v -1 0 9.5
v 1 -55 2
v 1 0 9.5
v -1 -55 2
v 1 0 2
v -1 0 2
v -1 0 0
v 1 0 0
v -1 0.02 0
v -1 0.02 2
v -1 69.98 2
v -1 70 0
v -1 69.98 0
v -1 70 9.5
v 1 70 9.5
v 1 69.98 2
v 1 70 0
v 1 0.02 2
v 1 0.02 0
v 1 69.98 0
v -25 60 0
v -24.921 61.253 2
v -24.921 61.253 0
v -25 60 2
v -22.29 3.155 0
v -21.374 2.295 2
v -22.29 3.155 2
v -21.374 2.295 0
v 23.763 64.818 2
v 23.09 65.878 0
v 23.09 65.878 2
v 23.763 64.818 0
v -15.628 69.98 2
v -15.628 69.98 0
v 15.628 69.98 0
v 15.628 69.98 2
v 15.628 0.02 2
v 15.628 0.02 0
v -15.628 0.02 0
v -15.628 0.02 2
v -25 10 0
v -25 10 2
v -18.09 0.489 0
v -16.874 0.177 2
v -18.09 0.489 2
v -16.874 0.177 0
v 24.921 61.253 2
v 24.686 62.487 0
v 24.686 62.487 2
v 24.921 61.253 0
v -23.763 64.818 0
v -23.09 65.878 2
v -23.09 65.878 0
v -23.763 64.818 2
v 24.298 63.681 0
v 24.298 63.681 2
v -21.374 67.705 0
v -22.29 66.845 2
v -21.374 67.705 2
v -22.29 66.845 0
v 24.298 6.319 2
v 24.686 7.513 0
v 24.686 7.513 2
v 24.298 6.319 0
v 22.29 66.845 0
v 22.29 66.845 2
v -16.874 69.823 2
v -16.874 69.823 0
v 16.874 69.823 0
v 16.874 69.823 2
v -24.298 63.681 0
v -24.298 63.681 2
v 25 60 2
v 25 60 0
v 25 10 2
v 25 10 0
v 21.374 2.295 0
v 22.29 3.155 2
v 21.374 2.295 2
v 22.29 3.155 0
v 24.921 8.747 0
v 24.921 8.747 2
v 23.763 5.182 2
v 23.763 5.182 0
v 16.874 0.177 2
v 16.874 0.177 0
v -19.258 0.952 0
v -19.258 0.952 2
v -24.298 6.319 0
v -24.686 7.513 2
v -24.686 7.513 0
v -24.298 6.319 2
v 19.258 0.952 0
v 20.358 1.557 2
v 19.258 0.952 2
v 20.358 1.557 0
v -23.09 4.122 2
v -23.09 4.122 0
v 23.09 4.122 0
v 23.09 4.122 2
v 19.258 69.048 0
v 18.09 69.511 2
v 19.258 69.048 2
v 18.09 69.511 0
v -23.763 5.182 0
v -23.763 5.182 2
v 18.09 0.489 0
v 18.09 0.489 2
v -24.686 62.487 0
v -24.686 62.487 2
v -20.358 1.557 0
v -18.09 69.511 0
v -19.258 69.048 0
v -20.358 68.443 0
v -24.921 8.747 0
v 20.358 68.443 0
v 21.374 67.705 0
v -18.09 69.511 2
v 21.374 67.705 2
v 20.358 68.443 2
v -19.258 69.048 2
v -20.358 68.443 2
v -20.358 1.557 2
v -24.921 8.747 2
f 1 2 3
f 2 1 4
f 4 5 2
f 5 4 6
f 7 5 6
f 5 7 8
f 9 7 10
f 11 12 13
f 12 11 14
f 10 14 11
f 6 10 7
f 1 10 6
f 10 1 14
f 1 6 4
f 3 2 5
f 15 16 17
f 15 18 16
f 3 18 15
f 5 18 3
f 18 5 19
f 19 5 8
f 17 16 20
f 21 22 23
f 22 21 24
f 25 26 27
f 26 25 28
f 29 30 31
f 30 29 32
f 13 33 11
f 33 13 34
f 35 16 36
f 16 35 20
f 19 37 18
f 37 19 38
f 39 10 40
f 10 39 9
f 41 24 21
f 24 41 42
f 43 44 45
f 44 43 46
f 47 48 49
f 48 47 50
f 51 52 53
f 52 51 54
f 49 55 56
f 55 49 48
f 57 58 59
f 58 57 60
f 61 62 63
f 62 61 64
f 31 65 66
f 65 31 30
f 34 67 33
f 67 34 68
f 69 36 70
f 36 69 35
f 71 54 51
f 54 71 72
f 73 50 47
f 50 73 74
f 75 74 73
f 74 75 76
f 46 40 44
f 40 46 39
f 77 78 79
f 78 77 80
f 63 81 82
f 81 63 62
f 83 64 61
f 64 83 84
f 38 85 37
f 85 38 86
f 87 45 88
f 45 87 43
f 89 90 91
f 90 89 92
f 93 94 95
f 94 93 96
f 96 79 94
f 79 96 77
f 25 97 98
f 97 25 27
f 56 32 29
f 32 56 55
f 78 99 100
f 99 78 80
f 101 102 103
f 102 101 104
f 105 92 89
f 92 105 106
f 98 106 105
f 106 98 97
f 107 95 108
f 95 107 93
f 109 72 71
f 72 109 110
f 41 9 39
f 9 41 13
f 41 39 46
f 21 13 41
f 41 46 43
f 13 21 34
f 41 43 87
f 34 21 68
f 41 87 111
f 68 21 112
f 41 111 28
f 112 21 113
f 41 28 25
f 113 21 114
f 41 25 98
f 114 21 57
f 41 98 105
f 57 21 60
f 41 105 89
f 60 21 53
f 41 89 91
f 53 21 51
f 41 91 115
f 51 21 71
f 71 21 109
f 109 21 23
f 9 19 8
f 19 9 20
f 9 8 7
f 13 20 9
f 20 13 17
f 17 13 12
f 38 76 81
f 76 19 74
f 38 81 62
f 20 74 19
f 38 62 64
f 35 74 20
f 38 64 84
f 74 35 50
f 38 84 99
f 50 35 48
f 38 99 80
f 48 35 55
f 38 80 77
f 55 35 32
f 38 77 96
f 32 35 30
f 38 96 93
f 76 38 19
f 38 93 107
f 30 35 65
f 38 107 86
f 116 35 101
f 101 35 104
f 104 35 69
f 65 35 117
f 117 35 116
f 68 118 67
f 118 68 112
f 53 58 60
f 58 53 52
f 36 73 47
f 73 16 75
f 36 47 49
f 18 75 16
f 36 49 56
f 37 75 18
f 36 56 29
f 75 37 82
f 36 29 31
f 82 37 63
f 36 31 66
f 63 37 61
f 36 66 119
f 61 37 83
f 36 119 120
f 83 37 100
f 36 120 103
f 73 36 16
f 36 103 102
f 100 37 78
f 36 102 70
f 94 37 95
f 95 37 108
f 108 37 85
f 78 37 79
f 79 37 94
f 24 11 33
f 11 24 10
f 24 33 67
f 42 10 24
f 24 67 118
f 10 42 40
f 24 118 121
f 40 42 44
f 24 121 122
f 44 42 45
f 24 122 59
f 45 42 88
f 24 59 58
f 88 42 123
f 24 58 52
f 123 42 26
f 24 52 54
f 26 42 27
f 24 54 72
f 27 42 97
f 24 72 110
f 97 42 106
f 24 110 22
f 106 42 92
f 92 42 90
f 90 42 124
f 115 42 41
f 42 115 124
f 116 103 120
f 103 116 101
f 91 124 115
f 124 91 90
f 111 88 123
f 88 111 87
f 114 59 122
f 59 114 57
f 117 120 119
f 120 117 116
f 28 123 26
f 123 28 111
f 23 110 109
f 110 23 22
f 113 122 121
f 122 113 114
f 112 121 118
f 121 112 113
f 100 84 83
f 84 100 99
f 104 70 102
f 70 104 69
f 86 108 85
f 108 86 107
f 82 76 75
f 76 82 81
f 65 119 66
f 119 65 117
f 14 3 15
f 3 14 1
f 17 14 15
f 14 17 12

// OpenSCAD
// file: plate.scad
plate_height = 70;
plate_width = 50;
plate_radius = 10;
plate_thickness = 2;

module plate() {
	translate([plate_radius-plate_width/2, plate_radius, 0]) minkowski() {
		cube([plate_width-plate_radius*2, plate_height-plate_radius*2, plate_thickness/2]);
		cylinder(r=plate_radius, h=plate_thickness/2, $fn=50);
	}
}

//plate();
// main file
//terrain: grass, dirt, gravel, sand

include<plate.scad>;

thron_size = 80;
thron_height = 7.5;
thron_width = 15;
thron_thickness = 2;

module thron() {
	bottom_points = [
		[thron_width/2, thron_size, 0],
		[thron_width/2, thron_size, thron_thickness],
		[thron_width/-2, thron_size, thron_thickness],
		[thron_width/-2, thron_size, 0],
		[0, 0, 0],
		[0, 5, thron_thickness],
	];

	bottom_faces = [[0,1,2,3],[5,4,3,2],[0,4,5,1],[0,3,4],[5,2,1]];

	top_points = [
		[thron_thickness/2, thron_size, thron_height+thron_thickness],
		[thron_thickness/-2, thron_size, thron_height+thron_thickness],
		[thron_thickness/-2, thron_size, thron_thickness],
		[thron_thickness/2, thron_size, thron_thickness],
		[thron_thickness/2, 25, thron_thickness],
		[thron_thickness/-2, 25, thron_thickness]
	];

	top_faces = [[0,1,2,3],[5,4,3,2],[0,4,5,1],[0,3,4],[5,2,1]];

	polyhedron(top_points, top_faces);
	polyhedron(bottom_points, bottom_faces);
}

plate();
translate([0, -thron_size, 0]) thron();
translate([thron_thickness/-2, 0, 0]) cube([thron_thickness, plate_height, thron_height+thron_thickness]);
